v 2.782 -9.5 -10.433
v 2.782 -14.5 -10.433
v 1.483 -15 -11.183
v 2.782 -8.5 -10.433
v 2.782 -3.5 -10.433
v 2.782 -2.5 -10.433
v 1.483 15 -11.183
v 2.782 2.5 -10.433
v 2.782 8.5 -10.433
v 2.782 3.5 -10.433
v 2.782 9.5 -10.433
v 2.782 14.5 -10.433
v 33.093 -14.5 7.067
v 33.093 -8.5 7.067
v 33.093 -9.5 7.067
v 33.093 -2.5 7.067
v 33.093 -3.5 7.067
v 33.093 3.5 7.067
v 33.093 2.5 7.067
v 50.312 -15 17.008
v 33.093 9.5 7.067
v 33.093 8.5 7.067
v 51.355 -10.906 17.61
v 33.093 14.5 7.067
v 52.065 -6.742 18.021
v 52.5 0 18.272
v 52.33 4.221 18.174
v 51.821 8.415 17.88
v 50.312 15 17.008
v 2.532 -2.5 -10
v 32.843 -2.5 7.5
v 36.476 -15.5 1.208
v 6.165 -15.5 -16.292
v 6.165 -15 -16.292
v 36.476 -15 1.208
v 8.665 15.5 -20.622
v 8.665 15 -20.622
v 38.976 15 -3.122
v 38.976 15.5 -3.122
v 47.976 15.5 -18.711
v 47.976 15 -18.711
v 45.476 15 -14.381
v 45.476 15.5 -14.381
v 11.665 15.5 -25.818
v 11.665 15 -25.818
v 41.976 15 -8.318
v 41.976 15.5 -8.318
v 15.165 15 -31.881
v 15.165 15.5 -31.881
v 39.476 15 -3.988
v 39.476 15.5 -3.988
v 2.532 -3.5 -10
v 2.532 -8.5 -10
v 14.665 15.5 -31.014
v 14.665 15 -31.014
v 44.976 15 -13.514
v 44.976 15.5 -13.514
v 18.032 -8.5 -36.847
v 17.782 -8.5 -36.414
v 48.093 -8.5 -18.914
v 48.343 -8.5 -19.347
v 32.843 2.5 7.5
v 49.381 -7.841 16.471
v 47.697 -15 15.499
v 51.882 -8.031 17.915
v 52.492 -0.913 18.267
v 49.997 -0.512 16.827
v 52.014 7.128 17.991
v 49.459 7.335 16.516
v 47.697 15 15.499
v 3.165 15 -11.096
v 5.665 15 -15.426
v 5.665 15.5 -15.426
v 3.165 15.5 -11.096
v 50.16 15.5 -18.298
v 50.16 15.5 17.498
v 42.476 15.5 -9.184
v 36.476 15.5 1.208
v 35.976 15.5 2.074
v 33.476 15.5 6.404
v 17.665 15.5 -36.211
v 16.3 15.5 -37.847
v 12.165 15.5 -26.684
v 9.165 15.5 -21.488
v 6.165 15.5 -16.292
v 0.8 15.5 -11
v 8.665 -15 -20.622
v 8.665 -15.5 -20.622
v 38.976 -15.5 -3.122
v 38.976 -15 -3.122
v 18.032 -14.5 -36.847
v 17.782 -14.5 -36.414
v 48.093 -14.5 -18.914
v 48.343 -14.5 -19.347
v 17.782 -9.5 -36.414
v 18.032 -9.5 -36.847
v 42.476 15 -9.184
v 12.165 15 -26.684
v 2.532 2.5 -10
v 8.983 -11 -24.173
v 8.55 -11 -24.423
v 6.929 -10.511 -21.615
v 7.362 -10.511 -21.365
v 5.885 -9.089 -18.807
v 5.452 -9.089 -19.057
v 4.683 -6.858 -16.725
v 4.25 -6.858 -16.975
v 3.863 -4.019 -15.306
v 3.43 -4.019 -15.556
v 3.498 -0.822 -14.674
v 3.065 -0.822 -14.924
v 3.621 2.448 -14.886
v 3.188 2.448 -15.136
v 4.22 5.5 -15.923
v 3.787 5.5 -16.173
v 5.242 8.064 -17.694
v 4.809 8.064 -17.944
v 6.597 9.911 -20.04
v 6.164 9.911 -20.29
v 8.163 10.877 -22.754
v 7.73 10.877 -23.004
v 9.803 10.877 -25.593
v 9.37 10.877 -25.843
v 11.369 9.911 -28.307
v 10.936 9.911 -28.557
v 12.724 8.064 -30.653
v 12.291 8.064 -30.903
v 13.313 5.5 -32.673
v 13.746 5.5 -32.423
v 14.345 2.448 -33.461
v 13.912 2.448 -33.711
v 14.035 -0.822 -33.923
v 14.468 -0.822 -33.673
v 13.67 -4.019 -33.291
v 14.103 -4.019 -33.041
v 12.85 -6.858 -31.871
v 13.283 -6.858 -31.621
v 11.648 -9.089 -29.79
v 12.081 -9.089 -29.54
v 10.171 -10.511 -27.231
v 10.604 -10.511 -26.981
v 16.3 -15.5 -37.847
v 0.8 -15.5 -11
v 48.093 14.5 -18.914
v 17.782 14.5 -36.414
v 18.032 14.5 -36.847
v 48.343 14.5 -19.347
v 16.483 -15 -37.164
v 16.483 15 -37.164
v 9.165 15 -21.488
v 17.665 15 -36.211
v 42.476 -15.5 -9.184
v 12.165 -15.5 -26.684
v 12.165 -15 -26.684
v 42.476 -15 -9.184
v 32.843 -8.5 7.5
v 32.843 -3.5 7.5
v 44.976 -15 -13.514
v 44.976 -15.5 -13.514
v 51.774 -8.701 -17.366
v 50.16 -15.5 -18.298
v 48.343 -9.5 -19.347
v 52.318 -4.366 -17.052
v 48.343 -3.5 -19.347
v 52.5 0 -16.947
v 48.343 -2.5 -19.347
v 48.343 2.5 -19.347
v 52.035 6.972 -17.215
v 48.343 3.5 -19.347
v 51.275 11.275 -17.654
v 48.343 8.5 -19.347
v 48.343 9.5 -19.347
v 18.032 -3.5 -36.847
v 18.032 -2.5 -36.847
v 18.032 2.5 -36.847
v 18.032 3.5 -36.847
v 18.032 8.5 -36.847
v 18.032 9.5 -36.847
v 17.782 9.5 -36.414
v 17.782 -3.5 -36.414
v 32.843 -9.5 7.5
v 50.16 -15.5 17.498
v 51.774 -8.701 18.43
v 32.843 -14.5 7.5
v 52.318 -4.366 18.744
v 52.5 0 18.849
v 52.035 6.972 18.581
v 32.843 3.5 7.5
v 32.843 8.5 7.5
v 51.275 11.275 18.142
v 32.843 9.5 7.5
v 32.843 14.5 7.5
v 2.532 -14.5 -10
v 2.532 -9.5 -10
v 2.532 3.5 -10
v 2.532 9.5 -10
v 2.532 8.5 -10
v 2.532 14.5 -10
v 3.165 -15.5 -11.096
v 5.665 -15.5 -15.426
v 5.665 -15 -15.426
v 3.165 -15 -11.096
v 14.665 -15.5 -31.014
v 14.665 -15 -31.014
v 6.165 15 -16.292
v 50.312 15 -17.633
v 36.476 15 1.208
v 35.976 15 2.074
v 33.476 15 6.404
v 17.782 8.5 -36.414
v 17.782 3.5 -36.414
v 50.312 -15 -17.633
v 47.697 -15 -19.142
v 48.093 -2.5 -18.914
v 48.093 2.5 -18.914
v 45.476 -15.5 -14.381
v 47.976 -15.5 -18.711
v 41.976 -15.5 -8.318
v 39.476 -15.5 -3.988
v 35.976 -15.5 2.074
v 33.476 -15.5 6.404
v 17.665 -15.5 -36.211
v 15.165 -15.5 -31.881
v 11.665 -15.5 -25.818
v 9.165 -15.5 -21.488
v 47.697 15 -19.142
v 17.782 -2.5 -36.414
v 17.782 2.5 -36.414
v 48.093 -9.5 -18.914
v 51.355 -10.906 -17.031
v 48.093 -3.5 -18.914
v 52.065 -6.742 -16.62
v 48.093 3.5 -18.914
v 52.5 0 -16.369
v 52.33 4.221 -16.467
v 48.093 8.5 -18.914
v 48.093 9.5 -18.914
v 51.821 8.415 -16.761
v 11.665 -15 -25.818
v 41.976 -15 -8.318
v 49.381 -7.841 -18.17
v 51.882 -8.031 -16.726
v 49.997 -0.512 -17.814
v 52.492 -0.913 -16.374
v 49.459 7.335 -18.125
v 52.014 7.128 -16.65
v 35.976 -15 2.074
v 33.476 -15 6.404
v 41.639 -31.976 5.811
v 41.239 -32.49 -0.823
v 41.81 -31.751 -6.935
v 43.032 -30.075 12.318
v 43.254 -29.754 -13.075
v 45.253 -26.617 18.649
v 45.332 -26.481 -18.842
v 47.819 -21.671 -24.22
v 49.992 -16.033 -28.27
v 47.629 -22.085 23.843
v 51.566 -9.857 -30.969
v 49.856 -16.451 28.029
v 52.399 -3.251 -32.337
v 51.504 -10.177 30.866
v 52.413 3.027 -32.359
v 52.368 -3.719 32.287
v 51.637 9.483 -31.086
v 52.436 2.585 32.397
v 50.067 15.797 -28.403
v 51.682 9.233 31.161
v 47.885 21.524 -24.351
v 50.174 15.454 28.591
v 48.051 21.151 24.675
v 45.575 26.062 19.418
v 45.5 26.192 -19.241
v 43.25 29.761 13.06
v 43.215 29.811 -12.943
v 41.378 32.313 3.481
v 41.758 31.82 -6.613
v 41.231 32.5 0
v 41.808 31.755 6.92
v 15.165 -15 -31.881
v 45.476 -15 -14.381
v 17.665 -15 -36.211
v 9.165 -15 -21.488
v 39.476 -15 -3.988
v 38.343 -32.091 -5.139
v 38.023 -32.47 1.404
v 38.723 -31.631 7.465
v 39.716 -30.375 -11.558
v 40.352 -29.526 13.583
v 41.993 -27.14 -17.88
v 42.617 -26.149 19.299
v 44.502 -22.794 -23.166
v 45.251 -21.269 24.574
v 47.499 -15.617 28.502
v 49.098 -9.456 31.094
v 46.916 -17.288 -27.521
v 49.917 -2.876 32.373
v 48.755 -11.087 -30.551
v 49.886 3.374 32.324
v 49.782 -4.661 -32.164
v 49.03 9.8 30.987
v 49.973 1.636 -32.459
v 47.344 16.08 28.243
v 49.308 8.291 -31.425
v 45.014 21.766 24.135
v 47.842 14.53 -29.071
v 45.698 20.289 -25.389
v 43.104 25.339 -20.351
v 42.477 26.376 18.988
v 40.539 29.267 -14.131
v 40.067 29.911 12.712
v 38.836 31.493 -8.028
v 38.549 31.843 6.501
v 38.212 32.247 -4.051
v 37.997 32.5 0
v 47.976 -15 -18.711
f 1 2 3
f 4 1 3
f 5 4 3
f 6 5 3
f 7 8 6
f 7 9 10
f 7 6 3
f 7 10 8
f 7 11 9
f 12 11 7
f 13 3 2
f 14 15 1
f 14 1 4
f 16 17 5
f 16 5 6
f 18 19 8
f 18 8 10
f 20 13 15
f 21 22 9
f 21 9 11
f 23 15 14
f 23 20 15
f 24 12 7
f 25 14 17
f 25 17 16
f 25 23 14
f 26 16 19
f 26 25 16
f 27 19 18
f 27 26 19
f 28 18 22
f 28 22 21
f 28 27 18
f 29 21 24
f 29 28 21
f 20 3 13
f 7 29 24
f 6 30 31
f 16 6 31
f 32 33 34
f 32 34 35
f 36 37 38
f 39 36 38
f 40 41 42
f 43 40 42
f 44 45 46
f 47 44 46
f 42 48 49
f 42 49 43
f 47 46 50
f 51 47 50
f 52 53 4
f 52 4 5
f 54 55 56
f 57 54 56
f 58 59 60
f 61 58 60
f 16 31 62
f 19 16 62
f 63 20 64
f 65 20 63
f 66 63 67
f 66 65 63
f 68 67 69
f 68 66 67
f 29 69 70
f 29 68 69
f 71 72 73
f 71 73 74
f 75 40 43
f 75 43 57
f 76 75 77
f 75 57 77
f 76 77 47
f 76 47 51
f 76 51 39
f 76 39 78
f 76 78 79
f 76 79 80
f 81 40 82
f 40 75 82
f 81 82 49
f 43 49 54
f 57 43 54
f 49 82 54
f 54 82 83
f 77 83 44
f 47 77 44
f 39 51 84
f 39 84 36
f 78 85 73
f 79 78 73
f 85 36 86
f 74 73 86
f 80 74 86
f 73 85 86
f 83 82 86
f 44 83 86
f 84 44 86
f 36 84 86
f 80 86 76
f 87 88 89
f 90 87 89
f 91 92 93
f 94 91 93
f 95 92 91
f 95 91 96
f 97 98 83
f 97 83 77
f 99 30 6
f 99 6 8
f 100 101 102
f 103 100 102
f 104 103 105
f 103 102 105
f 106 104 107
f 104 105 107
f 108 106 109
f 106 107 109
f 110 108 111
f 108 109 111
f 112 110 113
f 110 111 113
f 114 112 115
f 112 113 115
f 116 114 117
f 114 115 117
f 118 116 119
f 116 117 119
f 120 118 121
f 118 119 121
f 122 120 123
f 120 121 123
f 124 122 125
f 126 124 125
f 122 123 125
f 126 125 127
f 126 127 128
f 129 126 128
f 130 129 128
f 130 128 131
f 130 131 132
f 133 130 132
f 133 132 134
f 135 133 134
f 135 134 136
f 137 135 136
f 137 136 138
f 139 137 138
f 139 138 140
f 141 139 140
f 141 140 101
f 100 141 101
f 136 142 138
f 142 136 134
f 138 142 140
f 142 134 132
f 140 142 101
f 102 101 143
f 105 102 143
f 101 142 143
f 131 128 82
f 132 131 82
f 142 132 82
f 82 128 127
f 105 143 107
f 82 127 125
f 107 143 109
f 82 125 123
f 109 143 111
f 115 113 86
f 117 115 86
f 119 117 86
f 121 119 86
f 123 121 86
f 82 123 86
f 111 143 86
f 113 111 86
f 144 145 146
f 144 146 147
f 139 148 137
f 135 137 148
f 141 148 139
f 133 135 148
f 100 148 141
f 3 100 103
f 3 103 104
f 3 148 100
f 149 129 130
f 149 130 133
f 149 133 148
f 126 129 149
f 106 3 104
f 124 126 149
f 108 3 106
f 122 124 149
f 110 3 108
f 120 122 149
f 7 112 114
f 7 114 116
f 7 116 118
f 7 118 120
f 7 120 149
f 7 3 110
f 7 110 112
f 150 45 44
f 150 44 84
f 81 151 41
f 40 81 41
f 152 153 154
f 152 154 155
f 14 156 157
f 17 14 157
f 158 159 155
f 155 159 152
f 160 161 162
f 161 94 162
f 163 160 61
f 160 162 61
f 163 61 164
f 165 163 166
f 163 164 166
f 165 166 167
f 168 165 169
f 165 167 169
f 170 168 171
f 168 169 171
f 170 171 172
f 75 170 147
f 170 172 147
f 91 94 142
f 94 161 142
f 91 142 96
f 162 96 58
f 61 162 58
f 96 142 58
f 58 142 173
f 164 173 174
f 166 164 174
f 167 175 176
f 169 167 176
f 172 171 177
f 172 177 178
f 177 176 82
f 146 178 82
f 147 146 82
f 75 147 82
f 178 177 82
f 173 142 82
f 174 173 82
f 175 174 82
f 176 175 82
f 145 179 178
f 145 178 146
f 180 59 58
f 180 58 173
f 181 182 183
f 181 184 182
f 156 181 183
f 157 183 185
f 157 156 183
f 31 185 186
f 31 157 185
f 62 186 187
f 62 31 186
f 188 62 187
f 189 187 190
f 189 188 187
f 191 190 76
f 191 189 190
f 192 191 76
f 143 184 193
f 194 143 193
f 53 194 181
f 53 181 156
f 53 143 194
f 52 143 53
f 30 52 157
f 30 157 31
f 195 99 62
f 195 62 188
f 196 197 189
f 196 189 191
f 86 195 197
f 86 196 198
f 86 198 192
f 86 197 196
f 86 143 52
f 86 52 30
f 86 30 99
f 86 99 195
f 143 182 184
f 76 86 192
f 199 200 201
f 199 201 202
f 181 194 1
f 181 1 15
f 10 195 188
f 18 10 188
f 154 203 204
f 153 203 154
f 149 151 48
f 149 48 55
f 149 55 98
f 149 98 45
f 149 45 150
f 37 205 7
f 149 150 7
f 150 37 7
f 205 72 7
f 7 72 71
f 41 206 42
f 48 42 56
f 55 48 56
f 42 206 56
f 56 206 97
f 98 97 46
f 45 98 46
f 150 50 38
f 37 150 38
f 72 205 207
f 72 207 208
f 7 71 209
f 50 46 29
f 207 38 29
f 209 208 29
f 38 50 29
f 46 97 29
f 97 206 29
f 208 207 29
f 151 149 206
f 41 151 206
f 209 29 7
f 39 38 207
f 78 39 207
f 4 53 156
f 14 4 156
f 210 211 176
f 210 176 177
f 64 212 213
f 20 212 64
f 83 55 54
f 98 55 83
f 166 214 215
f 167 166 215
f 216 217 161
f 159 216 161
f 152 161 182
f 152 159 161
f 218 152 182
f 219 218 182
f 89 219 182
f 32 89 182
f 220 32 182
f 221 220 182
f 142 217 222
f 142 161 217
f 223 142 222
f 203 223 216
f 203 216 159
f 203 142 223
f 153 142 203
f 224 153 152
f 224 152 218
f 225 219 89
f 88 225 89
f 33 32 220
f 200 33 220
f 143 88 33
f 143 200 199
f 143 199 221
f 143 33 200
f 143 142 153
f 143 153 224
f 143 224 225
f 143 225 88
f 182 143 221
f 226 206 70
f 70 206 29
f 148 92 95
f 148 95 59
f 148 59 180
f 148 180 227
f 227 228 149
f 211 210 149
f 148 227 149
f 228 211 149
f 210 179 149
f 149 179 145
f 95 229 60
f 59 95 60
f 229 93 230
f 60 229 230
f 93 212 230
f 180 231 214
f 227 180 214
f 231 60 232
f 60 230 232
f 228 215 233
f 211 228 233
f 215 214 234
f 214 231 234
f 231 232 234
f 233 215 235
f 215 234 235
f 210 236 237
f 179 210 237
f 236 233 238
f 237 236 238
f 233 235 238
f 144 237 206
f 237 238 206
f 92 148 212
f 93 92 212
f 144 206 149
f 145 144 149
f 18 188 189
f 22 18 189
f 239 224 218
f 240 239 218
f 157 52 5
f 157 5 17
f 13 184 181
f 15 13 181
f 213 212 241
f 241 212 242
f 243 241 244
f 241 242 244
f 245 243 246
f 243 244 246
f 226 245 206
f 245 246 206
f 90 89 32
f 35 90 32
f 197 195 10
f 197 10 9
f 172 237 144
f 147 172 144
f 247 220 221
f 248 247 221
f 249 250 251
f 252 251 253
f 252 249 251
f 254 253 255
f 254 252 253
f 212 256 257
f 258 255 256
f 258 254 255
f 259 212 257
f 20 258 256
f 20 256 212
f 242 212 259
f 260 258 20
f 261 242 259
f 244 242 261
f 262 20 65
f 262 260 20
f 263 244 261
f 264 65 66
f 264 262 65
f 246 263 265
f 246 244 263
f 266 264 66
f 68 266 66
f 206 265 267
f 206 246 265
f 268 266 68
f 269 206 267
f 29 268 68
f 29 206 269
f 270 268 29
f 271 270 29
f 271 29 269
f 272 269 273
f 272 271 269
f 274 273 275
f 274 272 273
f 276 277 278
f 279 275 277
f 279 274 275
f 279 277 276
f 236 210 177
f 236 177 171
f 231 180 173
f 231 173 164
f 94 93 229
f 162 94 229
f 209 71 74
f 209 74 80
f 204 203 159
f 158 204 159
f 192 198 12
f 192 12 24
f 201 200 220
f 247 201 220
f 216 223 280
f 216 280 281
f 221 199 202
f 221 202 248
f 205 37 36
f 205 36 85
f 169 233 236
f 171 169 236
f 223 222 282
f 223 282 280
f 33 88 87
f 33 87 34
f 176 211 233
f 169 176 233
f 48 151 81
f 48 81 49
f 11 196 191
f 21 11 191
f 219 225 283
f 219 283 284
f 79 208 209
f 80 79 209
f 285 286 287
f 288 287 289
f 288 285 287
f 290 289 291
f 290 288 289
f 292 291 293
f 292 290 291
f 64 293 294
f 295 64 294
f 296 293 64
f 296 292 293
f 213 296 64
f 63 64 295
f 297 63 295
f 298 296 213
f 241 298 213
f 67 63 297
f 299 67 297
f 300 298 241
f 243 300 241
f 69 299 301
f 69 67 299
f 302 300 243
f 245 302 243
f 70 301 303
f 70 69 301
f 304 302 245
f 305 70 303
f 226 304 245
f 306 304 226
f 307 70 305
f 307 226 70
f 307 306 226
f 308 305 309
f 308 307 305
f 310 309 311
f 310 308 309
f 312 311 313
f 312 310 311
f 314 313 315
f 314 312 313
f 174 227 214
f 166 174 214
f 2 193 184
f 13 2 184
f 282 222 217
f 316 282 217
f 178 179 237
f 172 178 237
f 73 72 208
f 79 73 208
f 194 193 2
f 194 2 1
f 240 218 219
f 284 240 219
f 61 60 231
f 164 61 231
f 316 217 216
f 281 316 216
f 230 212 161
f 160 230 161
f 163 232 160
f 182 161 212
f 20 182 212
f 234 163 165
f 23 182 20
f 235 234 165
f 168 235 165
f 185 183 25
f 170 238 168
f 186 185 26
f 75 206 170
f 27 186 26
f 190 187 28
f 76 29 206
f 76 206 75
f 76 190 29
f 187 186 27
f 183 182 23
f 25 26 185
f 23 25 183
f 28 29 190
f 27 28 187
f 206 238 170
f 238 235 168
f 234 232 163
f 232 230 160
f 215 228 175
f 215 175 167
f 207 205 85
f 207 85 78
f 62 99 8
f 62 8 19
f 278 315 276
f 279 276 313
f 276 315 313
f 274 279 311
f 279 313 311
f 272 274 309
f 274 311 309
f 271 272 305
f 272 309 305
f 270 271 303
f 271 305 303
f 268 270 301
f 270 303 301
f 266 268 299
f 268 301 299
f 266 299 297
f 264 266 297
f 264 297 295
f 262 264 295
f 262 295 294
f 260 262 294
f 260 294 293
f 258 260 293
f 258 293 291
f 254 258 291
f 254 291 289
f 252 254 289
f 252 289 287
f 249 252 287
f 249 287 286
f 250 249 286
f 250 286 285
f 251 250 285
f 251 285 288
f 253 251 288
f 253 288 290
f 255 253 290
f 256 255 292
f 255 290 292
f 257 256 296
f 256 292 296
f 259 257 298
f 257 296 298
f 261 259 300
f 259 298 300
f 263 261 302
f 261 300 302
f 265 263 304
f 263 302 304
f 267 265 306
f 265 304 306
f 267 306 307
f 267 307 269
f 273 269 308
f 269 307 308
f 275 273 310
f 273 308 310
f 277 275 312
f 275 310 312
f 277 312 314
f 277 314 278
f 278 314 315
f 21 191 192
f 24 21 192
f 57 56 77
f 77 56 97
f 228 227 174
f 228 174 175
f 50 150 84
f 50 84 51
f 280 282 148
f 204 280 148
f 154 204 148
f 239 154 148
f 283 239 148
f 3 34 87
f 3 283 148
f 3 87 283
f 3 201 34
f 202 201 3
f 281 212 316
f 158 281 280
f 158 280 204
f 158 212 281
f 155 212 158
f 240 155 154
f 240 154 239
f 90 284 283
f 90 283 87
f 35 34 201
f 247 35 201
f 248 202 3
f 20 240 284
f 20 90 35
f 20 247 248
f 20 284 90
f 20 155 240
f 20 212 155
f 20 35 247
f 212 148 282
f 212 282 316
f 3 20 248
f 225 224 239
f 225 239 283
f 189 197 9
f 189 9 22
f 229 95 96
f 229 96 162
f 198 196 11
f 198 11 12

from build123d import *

# Parameters (mm, degrees)
F0_R      = 52.5
F0_R_2    = 50
F1_DEPTH  = 50
F2_R      = 32.5
F3_DEPTH  = 60
F4_W      = 31
F4_H      = 31
F6_DEPTH  = 60
F7_W      = 30
F7_H      = 30
F8_DEPTH  = 59.5
F9_W      = 35
F9_H      = 5
F10_DEPTH = 50
F11_W     = 35
F11_H     = 5
F12_DEPTH = 50
F13_R     = 11
F14_DEPTH = 25
F15_ANGLE = 30
F17_W     = 30
F17_H     = 30
F18_DEPTH = 25
F19_R     = 52.5
F20_DEPTH = 50


with BuildPart() as f1:
    # F0 (on Top) → F1 (new body, symmetric)
    with BuildSketch(Plane.XY):
        Circle(F0_R)
        Circle(F0_R_2, mode=Mode.SUBTRACT)
    extrude(amount=F1_DEPTH, both=True)


with BuildPart() as f3:
    # F2 (on Right) → F3 (new body)
    with BuildSketch(Plane.YZ):
        Circle(F2_R)
    extrude(amount=F3_DEPTH)

    # F5: intersect F1
    add(f1.part, mode=Mode.INTERSECT)


with BuildPart() as f6:
    # F4 (on Right) → F6 (new body)
    with BuildSketch(Plane.YZ):
        Rectangle(F4_W, F4_H)
    extrude(amount=F6_DEPTH)


with BuildPart() as f8_tool:
    # F7 (on face) → F8 (new body)
    with BuildSketch(Plane.YZ.offset(60)):
        Rectangle(F7_W, F7_H)
    extrude(amount=-F8_DEPTH)


with BuildPart() as f3_1:
    add(f3.part)

    # F8: cut by f8_tool
    add(f8_tool.part, mode=Mode.SUBTRACT)

    # F17 (on face) → F18 (cut)
    with BuildSketch(Plane(origin=(47.798385, 0, 27.59641), x_dir=(0, 1, 0), z_dir=(0.866025, 0, 0.5))):
        with Locations((0, -25.426279)):
            Rectangle(F17_W, F17_H)
    extrude(amount=-F18_DEPTH, mode=Mode.SUBTRACT)


with BuildPart() as f6_1:
    add(f6.part)

    # F8: cut by f8_tool
    add(f8_tool.part, mode=Mode.SUBTRACT)

    # F9 (on face) → F10 (cut)
    with BuildSketch(Plane.XY.offset(15.5)):
        with Locations((19.5, -12)):
            Rectangle(F9_W, F9_H)
        with Locations((19.5, -6)):
            Rectangle(F9_W, F9_H)
        with Locations((19.5, 0)):
            Rectangle(F9_W, F9_H)
        with Locations((19.5, 6)):
            Rectangle(F9_W, F9_H)
        with Locations((19.5, 12)):
            Rectangle(F9_W, F9_H)
    extrude(amount=-F10_DEPTH, mode=Mode.SUBTRACT)

    # F11 (on face) → F12 (cut)
    with BuildSketch(Plane.XZ.offset(15.5)):
        with Locations((19.5, 11.734556)):
            Rectangle(F11_W, F11_H)
        with Locations((19.5, 5.734556)):
            Rectangle(F11_W, F11_H)
        with Locations((19.5, -0.265444)):
            Rectangle(F11_W, F11_H)
        with Locations((19.5, -6.265444)):
            Rectangle(F11_W, F11_H)
        with Locations((19.5, -12.265444)):
            Rectangle(F11_W, F11_H)
    extrude(amount=-F12_DEPTH, mode=Mode.SUBTRACT)

    # F13 (on face) → F14 (cut)
    with BuildSketch(Plane(origin=(0, 0, 0), x_dir=(0, -1, 0), z_dir=(-1, 0, 0))):
        Circle(F13_R)
    extrude(amount=-F14_DEPTH, mode=Mode.SUBTRACT)


with BuildPart() as f6_2:
    # F15: moved
    add(f6_1.part.rotate(Axis((0, 0, 15.5), (0, -1, 0)), F15_ANGLE))


with BuildPart() as f6_3:
    # F16: moved
    add(f6_2.part.moved(Location((0.8, 0, -26.5))))


with BuildPart() as f20:
    # F19 (on Top) → F20 (new body, symmetric)
    with BuildSketch(Plane.XY):
        Circle(F19_R)
    extrude(amount=F20_DEPTH, both=True)


with BuildPart() as f6_4:
    add(f6_3.part)

    # F21: intersect F20
    add(f20.part, mode=Mode.INTERSECT)


solid = Compound([f3_1.part, f6_4.part])
